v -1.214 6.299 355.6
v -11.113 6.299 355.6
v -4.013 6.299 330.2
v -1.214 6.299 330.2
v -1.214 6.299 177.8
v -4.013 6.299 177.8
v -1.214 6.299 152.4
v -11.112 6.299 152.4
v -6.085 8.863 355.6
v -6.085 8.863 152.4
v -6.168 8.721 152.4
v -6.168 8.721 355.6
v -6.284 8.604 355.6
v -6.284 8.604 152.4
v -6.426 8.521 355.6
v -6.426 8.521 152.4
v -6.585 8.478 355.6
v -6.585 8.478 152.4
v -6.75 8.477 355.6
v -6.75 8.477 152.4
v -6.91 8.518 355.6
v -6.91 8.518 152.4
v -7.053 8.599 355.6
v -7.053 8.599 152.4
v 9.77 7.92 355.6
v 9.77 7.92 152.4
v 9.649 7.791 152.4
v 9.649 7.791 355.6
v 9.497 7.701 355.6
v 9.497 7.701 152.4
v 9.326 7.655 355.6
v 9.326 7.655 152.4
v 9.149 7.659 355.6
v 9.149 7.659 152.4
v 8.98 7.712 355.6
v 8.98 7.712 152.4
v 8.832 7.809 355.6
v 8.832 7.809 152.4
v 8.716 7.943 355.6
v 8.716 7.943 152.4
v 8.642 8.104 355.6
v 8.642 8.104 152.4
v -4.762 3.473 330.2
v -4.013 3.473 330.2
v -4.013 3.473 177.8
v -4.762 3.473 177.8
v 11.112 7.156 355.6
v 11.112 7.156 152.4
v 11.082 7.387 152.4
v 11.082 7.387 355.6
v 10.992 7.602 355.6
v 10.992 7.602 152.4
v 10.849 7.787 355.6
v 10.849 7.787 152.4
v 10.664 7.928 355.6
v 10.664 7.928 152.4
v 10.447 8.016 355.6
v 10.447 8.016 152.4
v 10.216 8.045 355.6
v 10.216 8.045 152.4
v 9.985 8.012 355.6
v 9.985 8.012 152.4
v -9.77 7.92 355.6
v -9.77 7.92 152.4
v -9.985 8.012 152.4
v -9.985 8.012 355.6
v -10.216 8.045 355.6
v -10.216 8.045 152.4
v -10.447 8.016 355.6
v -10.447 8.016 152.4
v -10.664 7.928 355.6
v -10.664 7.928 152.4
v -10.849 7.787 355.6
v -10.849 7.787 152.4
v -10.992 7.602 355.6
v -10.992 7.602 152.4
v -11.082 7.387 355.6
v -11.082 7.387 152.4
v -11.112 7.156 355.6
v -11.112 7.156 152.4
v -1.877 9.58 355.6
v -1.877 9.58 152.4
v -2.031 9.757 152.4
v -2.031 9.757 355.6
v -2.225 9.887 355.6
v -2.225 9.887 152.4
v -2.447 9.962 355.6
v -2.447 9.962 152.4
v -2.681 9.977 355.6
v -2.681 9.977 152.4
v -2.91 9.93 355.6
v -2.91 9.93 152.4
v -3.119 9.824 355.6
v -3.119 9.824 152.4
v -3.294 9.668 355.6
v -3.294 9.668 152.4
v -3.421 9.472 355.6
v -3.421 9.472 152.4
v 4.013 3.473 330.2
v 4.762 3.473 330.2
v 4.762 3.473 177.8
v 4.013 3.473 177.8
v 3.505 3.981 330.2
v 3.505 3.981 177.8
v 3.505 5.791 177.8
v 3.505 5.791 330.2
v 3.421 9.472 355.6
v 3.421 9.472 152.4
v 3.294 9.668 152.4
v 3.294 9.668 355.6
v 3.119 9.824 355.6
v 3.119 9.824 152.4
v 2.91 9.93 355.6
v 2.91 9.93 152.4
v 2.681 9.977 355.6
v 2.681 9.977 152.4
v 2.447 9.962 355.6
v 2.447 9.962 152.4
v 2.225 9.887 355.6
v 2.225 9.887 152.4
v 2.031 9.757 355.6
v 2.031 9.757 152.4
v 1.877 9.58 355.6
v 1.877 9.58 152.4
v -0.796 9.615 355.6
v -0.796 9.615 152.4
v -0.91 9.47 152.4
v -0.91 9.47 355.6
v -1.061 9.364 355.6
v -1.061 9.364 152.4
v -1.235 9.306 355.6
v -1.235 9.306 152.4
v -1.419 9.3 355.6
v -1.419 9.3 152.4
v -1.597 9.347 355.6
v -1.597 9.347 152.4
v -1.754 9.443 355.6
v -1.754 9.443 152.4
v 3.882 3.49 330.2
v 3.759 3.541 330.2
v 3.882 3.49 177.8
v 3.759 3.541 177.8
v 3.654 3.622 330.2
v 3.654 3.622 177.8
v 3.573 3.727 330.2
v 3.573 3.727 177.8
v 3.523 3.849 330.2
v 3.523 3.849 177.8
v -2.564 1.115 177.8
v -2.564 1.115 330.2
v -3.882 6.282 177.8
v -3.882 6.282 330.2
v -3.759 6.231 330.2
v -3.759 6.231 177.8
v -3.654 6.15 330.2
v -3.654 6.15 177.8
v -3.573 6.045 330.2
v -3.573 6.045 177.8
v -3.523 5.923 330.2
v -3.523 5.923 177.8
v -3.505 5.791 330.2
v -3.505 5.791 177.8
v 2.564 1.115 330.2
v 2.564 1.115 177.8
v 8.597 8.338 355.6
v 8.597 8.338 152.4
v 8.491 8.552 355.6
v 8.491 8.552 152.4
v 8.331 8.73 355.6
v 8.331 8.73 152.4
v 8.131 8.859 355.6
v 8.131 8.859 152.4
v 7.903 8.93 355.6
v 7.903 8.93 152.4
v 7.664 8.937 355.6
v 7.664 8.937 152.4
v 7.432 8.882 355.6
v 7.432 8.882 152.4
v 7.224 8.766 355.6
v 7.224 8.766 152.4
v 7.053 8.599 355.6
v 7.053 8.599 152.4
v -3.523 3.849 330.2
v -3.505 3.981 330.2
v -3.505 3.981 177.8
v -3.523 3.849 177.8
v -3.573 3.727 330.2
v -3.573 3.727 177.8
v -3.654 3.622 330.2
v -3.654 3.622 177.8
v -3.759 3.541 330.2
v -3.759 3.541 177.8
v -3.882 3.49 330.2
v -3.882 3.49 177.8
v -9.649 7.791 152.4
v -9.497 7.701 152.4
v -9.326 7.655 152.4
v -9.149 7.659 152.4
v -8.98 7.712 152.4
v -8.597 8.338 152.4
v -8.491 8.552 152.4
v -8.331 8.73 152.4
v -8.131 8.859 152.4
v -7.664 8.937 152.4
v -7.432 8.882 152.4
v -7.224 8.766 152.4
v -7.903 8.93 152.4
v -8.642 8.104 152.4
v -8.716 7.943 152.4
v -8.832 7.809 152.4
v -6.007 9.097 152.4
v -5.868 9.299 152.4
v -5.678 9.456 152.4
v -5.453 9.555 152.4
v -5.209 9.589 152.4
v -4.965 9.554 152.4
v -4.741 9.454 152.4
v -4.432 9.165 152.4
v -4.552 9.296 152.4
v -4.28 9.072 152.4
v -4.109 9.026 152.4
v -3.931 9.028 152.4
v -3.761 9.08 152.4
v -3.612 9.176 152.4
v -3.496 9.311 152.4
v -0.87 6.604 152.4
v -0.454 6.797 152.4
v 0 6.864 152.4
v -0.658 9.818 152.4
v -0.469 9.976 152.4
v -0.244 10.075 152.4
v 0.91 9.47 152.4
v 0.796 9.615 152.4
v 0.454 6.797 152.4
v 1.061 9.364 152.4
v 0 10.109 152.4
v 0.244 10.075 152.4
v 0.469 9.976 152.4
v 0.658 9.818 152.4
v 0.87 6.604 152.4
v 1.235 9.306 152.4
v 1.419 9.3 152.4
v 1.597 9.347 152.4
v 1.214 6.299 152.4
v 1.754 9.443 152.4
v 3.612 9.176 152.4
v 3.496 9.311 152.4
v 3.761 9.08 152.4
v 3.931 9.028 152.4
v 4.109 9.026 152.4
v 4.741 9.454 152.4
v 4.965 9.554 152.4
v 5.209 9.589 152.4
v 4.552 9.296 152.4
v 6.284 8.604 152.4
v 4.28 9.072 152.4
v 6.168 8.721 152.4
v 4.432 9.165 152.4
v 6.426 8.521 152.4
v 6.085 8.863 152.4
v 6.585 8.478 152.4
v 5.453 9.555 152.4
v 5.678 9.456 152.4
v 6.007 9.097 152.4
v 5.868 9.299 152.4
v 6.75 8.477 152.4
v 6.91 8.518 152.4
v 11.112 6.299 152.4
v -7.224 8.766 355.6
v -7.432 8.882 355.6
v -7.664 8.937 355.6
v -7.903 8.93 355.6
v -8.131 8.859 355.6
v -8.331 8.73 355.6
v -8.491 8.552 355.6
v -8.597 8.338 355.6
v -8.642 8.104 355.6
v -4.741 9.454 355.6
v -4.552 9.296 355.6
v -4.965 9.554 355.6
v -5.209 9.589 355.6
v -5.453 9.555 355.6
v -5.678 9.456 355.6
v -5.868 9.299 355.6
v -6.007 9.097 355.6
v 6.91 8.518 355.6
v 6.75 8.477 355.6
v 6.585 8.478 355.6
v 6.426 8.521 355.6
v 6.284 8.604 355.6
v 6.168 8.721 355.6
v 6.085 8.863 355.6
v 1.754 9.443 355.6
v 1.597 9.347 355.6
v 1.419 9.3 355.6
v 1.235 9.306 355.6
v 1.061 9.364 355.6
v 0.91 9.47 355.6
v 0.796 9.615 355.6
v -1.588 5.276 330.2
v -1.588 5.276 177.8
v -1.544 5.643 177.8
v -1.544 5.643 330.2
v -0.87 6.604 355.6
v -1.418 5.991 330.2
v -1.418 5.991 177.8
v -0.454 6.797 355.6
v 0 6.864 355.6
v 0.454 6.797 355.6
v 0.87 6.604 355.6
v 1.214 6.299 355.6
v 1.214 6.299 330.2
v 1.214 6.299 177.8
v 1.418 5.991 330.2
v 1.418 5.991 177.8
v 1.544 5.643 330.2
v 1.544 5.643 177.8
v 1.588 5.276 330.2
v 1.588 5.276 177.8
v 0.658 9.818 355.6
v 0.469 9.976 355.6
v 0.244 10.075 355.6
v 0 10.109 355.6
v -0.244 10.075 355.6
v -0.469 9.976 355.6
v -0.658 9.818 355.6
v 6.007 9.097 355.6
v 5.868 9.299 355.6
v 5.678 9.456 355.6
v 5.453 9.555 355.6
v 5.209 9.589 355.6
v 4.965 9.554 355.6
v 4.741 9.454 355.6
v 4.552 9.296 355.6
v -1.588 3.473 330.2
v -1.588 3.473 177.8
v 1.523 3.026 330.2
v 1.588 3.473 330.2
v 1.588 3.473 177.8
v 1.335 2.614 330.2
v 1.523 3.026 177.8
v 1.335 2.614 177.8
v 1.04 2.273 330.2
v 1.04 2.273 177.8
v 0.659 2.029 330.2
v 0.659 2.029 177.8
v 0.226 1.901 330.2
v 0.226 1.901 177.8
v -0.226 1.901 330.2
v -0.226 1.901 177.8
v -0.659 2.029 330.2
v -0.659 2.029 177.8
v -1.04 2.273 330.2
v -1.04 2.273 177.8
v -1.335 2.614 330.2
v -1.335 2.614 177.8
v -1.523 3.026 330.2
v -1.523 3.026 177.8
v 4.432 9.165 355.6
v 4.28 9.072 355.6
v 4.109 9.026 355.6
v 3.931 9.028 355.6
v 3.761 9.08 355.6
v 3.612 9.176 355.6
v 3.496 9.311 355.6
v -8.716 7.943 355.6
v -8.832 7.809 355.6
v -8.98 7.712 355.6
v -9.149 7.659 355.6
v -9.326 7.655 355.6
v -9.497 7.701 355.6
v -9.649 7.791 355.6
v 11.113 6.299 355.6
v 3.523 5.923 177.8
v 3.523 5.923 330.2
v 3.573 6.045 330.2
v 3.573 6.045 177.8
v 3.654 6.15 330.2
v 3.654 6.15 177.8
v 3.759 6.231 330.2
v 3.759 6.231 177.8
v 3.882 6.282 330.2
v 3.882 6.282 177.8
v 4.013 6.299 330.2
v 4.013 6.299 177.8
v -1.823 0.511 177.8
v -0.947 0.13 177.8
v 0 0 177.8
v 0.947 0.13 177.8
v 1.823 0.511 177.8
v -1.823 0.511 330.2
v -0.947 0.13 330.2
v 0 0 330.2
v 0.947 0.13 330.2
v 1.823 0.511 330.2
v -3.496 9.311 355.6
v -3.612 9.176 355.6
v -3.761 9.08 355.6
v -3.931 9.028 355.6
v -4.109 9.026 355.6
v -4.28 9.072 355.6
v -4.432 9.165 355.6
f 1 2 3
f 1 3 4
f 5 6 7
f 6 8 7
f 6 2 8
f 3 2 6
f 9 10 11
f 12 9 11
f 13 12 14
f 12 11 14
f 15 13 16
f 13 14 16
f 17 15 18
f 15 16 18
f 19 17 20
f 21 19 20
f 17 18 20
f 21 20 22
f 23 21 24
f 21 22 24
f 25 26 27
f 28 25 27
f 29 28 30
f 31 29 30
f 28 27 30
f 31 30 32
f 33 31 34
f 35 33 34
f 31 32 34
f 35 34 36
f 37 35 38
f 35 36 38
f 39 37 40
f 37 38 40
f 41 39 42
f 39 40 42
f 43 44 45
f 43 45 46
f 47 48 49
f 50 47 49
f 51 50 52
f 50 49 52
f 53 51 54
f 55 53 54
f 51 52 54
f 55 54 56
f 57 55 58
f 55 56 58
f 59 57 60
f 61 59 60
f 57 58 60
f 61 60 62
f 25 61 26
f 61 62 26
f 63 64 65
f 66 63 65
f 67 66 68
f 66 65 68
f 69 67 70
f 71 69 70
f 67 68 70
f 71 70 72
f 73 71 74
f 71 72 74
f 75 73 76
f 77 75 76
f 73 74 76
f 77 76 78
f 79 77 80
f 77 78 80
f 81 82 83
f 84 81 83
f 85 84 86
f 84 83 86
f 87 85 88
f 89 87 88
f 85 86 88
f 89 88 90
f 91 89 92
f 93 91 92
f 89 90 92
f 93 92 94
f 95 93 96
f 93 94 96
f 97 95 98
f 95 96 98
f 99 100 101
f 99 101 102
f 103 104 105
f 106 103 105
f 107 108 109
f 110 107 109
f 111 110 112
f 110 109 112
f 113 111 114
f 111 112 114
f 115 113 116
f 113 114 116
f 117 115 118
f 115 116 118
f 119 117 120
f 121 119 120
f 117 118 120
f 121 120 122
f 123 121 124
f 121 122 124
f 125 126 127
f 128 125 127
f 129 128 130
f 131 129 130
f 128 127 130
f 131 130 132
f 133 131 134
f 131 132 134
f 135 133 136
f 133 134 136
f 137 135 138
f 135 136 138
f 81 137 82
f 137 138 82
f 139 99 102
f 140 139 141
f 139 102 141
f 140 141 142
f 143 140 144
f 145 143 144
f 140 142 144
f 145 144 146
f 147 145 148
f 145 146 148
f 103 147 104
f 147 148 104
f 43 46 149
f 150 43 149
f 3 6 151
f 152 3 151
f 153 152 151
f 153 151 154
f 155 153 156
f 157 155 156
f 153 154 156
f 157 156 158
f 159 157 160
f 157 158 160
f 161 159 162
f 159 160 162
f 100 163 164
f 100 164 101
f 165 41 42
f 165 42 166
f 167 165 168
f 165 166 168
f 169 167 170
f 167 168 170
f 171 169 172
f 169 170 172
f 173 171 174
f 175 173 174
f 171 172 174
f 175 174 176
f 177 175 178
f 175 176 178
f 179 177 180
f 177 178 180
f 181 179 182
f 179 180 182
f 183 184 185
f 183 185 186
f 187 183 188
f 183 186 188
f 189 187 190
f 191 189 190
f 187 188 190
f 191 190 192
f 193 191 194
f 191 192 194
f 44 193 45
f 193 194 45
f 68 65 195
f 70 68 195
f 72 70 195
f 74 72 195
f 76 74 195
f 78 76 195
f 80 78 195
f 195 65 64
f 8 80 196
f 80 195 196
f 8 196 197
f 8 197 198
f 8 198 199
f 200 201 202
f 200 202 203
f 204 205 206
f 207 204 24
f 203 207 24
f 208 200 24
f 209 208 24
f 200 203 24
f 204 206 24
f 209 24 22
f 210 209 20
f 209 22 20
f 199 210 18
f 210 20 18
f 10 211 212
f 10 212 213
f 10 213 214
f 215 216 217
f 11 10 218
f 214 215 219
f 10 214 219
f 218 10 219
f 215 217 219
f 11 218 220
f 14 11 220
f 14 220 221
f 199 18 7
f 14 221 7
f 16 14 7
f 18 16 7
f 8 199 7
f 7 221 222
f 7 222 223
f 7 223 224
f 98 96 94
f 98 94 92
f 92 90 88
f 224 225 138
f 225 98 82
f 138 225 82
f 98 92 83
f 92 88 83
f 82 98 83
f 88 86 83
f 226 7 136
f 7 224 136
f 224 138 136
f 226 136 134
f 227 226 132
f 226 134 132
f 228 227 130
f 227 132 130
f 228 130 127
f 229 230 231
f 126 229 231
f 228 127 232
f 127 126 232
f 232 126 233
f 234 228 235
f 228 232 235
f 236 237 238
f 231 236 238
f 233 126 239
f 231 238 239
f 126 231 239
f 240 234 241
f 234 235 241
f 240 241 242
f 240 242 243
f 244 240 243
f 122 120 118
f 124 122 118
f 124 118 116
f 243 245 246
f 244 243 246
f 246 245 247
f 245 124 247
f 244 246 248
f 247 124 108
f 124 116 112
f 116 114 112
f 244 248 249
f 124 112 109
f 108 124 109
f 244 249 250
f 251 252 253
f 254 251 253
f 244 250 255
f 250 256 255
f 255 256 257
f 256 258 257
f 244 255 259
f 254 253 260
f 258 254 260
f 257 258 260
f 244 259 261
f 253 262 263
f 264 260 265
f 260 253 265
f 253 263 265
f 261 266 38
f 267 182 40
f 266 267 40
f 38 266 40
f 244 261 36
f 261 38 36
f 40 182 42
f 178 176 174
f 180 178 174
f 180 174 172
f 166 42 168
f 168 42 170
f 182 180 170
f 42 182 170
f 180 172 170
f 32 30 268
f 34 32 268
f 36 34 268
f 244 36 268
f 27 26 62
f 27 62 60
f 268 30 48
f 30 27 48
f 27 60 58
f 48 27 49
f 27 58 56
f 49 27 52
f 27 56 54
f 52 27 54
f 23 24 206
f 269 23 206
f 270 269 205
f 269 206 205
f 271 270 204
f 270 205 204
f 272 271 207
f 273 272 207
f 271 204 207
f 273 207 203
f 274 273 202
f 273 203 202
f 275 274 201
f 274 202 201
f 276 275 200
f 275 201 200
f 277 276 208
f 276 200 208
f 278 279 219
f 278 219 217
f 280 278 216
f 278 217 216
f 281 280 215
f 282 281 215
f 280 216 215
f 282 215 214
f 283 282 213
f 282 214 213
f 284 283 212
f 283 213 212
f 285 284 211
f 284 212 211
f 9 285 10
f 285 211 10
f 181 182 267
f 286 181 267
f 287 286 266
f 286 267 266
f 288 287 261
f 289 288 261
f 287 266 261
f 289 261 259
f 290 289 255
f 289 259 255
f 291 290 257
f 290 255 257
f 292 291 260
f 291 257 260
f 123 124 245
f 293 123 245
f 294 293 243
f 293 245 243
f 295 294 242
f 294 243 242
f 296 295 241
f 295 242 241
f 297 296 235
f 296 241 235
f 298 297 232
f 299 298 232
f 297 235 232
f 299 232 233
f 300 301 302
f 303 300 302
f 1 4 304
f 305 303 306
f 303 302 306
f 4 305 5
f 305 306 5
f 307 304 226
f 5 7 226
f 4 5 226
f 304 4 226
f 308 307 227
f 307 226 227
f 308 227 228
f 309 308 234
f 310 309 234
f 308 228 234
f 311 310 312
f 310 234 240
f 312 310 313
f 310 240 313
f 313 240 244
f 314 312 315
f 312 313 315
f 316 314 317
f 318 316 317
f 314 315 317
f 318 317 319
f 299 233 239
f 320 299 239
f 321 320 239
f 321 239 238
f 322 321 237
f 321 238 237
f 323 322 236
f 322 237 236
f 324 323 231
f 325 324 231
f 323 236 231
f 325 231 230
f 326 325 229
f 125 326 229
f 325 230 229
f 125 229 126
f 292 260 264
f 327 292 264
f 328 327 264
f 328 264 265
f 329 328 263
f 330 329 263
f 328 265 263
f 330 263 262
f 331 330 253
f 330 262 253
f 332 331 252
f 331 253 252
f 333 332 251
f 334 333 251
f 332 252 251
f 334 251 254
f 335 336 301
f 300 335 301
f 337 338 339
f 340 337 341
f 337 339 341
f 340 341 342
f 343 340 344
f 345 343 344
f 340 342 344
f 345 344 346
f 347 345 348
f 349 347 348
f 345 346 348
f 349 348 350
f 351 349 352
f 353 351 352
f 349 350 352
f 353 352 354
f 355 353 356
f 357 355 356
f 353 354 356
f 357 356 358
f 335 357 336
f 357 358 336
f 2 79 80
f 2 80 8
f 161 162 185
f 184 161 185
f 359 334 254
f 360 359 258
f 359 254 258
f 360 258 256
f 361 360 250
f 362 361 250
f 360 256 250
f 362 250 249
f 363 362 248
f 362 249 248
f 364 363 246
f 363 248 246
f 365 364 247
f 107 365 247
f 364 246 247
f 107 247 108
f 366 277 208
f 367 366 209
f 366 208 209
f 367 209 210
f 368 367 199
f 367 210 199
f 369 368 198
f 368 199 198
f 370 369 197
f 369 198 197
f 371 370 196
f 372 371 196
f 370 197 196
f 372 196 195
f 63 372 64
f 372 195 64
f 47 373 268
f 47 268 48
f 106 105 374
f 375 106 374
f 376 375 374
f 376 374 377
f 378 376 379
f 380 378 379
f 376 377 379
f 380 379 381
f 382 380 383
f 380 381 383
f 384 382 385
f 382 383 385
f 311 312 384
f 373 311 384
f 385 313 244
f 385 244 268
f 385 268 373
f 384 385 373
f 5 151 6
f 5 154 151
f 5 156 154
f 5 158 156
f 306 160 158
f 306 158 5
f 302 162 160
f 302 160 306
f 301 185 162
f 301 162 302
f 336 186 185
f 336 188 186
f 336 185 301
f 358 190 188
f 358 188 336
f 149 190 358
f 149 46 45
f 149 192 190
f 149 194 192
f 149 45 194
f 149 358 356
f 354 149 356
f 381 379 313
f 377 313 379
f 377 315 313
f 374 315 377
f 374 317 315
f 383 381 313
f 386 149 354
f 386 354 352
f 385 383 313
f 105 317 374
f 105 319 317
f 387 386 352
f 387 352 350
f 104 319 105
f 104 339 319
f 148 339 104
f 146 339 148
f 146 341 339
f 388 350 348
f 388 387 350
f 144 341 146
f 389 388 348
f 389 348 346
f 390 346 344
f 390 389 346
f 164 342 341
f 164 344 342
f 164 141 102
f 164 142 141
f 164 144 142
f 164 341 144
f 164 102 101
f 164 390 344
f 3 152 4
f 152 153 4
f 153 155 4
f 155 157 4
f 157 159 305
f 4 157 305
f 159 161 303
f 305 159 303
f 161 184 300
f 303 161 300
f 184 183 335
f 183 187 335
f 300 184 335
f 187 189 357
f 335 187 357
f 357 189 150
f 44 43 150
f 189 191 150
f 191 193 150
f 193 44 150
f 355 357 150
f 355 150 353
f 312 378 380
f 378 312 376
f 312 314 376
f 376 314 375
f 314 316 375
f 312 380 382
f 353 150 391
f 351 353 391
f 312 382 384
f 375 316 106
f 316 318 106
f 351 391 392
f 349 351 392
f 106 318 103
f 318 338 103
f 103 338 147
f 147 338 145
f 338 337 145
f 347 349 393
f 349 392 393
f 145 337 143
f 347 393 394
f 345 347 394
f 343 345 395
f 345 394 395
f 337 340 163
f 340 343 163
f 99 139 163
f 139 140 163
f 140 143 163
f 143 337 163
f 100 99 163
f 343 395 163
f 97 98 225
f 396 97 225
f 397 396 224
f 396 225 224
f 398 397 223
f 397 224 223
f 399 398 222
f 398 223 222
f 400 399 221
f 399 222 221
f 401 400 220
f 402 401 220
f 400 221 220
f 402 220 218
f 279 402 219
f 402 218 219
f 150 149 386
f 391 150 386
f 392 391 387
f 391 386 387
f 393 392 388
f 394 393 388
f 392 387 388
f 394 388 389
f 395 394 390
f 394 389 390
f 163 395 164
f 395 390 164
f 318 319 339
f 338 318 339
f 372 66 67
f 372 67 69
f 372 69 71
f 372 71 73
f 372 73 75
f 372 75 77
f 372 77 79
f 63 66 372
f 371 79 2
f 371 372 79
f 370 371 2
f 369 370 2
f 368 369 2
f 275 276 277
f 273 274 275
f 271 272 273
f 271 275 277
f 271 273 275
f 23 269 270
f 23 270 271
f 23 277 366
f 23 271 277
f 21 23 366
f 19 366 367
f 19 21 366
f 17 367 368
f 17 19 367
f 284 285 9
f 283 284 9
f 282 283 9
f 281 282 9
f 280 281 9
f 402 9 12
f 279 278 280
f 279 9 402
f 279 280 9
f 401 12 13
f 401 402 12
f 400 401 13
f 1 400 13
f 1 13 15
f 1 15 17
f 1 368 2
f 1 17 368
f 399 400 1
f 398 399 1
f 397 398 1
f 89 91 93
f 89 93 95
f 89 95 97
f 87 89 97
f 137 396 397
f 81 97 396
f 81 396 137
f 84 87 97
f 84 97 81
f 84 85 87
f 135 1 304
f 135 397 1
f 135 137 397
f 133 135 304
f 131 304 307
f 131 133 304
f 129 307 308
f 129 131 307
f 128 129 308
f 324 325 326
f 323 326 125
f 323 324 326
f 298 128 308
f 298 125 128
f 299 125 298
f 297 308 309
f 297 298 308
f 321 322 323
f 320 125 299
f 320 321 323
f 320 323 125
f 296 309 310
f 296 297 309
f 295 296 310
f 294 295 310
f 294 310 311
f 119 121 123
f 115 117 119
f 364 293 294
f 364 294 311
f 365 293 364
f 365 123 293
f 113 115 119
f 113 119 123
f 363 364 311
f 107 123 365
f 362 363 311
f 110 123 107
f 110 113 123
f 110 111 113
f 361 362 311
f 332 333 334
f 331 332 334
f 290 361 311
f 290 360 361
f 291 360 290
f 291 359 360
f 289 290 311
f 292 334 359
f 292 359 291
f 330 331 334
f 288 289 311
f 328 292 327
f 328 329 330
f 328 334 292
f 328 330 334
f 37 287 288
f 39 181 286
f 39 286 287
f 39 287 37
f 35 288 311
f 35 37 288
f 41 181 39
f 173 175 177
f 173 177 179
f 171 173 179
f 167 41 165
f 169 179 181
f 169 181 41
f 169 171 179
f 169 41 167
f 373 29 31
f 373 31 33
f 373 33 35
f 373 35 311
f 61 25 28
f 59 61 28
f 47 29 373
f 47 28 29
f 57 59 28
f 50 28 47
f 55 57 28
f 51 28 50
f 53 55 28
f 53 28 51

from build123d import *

# Parameters (mm, degrees)
BOSS_EXTRUDE2_DEPTH = 203.2
CUT_EXTRUDE1_REACH  = 357.917
SKETCH2_W           = 22.225
SKETCH2_H           = 25.4


with BuildPart() as part:
    # Sketch1 → Boss-Extrude2 (new body)
    with BuildSketch(Plane.XY.offset(152.4)):
        with BuildLine():
            Line((-11.1125, 7.155754294), (-11.1125, 6.2992))
            Line((-11.1125, 6.2992), (-4.0132, 6.2992))
            ThreePointArc((-4.0132, 6.2992), (-3.653989755, 6.150410245), (-3.5052, 5.7912))
            Line((-3.5052, 5.7912), (-3.5052, 3.980754294))
            ThreePointArc((-3.5052, 3.980754294), (-3.653989755, 3.621544049), (-4.0132, 3.472754294))
            Line((-4.0132, 3.472754294), (-4.7625, 3.472754294))
            Line((-4.7625, 3.472754294), (-2.563540889, 1.114659348))
            ThreePointArc((-2.563540889, 1.114659348), (1.91e-07, 0), (2.563541217, 1.114659472))
            Line((2.563541217, 1.114659472), (4.7625, 3.472754294))
            Line((4.7625, 3.472754294), (4.0132, 3.472754294))
            ThreePointArc((4.0132, 3.472754294), (3.653989755, 3.621544049), (3.5052, 3.980754294))
            Line((3.5052, 3.980754294), (3.5052, 5.7912))
            ThreePointArc((3.5052, 5.7912), (3.653989755, 6.150410245), (4.0132, 6.2992))
            Line((4.0132, 6.2992), (11.1125, 6.2992))
            Line((11.1125, 6.2992), (11.1125, 7.155754292))
            ThreePointArc((11.1125, 7.155754292), (10.663537153, 7.928210313), (9.770119113, 7.920454737))
            ThreePointArc((9.770119113, 7.920454737), (9.148763616, 7.659085907), (8.642363834, 8.104007899))
            ThreePointArc((8.642363834, 8.104007899), (8.019118897, 8.901877), (7.05308944, 8.59886472))
            ThreePointArc((7.05308944, 8.59886472), (6.504535766, 8.494192995), (6.085440415, 8.863281588))
            ThreePointArc((6.085440415, 8.863281588), (5.452899276, 9.555232733), (4.552056662, 9.295642159))
            ThreePointArc((4.552056662, 9.295642159), (3.931317659, 9.028192281), (3.421209266, 9.471628606))
            ThreePointArc((3.421209266, 9.471628606), (2.68084511, 9.976690828), (1.876956272, 9.580471612))
            ThreePointArc((1.876956272, 9.580471612), (1.327001325, 9.29621405), (0.796430567, 9.615192851))
            ThreePointArc((0.796430567, 9.615192851), (-2e-09, 10.1092), (-0.796430568, 9.615192848))
            ThreePointArc((-0.796430568, 9.615192848), (-1.327001326, 9.29621405), (-1.876956272, 9.580471612))
            ThreePointArc((-1.876956272, 9.580471612), (-2.680845114, 9.976690828), (-3.421209269, 9.471628598))
            ThreePointArc((-3.421209269, 9.471628598), (-3.931317662, 9.028192282), (-4.552056659, 9.295642158))
            ThreePointArc((-4.552056659, 9.295642158), (-5.45289928, 9.555232733), (-6.085440418, 8.863281574))
            ThreePointArc((-6.085440418, 8.863281574), (-6.504535766, 8.494192992), (-7.053089431, 8.59886471))
            ThreePointArc((-7.053089431, 8.59886471), (-8.019118881, 8.901877006), (-8.642363831, 8.104007918))
            ThreePointArc((-8.642363831, 8.104007918), (-9.148763609, 7.659085911), (-9.770119113, 7.920454739))
            ThreePointArc((-9.770119113, 7.920454739), (-10.663537153, 7.928210315), (-11.1125, 7.155754294))
        make_face()
        with BuildLine():
            Line((-1.5875, 3.472754294), (-1.5875, 5.276154294))
            ThreePointArc((-1.5875, 5.276154294), (0, 6.863654294), (1.5875, 5.276154294))
            Line((1.5875, 5.276154294), (1.5875, 3.472754294))
            ThreePointArc((1.5875, 3.472754294), (0, 1.885254294), (-1.5875, 3.472754294))
        make_face(mode=Mode.SUBTRACT)
    extrude(amount=BOSS_EXTRUDE2_DEPTH)

    # Cut-Extrude1: up to this face of the body (flat: up to its plane)
    cut_extrude1_end = Plane(part.part.faces().sort_by_distance((7.56285, 6.2992, 254))[0])
    # Sketch2 → Cut-Extrude1 (cut, up to the picked face)
    with BuildSketch(Plane(origin=(0, 0, 0), x_dir=(1, 0, 0), z_dir=(0, 1, 0)), mode=Mode.PRIVATE) as cut_extrude1_sk1:
        with Locations((0, -165.1)):
            Rectangle(SKETCH2_W, SKETCH2_H)
    cut_extrude1_tool1 = split(extrude(cut_extrude1_sk1.sketch, amount=CUT_EXTRUDE1_REACH, mode=Mode.PRIVATE), bisect_by=cut_extrude1_end, keep=Keep.BOTH, mode=Mode.PRIVATE)
    # Sketch2 → Cut-Extrude1 (cut, up to the picked face)
    with BuildSketch(Plane(origin=(0, 0, 0), x_dir=(1, 0, 0), z_dir=(0, 1, 0)), mode=Mode.PRIVATE) as cut_extrude1_sk2:
        with Locations((0, -342.9)):
            Rectangle(SKETCH2_W, SKETCH2_H)
    cut_extrude1_tool2 = split(extrude(cut_extrude1_sk2.sketch, amount=CUT_EXTRUDE1_REACH, mode=Mode.PRIVATE), bisect_by=cut_extrude1_end, keep=Keep.BOTH, mode=Mode.PRIVATE)
    add(cut_extrude1_tool1.solids().sort_by(Axis((0, 0, 165.1), (0, 1, 0)))[0], mode=Mode.SUBTRACT)
    add(cut_extrude1_tool2.solids().sort_by(Axis((0, 0, 342.9), (0, 1, 0)))[0], mode=Mode.SUBTRACT)


solid = part.part
